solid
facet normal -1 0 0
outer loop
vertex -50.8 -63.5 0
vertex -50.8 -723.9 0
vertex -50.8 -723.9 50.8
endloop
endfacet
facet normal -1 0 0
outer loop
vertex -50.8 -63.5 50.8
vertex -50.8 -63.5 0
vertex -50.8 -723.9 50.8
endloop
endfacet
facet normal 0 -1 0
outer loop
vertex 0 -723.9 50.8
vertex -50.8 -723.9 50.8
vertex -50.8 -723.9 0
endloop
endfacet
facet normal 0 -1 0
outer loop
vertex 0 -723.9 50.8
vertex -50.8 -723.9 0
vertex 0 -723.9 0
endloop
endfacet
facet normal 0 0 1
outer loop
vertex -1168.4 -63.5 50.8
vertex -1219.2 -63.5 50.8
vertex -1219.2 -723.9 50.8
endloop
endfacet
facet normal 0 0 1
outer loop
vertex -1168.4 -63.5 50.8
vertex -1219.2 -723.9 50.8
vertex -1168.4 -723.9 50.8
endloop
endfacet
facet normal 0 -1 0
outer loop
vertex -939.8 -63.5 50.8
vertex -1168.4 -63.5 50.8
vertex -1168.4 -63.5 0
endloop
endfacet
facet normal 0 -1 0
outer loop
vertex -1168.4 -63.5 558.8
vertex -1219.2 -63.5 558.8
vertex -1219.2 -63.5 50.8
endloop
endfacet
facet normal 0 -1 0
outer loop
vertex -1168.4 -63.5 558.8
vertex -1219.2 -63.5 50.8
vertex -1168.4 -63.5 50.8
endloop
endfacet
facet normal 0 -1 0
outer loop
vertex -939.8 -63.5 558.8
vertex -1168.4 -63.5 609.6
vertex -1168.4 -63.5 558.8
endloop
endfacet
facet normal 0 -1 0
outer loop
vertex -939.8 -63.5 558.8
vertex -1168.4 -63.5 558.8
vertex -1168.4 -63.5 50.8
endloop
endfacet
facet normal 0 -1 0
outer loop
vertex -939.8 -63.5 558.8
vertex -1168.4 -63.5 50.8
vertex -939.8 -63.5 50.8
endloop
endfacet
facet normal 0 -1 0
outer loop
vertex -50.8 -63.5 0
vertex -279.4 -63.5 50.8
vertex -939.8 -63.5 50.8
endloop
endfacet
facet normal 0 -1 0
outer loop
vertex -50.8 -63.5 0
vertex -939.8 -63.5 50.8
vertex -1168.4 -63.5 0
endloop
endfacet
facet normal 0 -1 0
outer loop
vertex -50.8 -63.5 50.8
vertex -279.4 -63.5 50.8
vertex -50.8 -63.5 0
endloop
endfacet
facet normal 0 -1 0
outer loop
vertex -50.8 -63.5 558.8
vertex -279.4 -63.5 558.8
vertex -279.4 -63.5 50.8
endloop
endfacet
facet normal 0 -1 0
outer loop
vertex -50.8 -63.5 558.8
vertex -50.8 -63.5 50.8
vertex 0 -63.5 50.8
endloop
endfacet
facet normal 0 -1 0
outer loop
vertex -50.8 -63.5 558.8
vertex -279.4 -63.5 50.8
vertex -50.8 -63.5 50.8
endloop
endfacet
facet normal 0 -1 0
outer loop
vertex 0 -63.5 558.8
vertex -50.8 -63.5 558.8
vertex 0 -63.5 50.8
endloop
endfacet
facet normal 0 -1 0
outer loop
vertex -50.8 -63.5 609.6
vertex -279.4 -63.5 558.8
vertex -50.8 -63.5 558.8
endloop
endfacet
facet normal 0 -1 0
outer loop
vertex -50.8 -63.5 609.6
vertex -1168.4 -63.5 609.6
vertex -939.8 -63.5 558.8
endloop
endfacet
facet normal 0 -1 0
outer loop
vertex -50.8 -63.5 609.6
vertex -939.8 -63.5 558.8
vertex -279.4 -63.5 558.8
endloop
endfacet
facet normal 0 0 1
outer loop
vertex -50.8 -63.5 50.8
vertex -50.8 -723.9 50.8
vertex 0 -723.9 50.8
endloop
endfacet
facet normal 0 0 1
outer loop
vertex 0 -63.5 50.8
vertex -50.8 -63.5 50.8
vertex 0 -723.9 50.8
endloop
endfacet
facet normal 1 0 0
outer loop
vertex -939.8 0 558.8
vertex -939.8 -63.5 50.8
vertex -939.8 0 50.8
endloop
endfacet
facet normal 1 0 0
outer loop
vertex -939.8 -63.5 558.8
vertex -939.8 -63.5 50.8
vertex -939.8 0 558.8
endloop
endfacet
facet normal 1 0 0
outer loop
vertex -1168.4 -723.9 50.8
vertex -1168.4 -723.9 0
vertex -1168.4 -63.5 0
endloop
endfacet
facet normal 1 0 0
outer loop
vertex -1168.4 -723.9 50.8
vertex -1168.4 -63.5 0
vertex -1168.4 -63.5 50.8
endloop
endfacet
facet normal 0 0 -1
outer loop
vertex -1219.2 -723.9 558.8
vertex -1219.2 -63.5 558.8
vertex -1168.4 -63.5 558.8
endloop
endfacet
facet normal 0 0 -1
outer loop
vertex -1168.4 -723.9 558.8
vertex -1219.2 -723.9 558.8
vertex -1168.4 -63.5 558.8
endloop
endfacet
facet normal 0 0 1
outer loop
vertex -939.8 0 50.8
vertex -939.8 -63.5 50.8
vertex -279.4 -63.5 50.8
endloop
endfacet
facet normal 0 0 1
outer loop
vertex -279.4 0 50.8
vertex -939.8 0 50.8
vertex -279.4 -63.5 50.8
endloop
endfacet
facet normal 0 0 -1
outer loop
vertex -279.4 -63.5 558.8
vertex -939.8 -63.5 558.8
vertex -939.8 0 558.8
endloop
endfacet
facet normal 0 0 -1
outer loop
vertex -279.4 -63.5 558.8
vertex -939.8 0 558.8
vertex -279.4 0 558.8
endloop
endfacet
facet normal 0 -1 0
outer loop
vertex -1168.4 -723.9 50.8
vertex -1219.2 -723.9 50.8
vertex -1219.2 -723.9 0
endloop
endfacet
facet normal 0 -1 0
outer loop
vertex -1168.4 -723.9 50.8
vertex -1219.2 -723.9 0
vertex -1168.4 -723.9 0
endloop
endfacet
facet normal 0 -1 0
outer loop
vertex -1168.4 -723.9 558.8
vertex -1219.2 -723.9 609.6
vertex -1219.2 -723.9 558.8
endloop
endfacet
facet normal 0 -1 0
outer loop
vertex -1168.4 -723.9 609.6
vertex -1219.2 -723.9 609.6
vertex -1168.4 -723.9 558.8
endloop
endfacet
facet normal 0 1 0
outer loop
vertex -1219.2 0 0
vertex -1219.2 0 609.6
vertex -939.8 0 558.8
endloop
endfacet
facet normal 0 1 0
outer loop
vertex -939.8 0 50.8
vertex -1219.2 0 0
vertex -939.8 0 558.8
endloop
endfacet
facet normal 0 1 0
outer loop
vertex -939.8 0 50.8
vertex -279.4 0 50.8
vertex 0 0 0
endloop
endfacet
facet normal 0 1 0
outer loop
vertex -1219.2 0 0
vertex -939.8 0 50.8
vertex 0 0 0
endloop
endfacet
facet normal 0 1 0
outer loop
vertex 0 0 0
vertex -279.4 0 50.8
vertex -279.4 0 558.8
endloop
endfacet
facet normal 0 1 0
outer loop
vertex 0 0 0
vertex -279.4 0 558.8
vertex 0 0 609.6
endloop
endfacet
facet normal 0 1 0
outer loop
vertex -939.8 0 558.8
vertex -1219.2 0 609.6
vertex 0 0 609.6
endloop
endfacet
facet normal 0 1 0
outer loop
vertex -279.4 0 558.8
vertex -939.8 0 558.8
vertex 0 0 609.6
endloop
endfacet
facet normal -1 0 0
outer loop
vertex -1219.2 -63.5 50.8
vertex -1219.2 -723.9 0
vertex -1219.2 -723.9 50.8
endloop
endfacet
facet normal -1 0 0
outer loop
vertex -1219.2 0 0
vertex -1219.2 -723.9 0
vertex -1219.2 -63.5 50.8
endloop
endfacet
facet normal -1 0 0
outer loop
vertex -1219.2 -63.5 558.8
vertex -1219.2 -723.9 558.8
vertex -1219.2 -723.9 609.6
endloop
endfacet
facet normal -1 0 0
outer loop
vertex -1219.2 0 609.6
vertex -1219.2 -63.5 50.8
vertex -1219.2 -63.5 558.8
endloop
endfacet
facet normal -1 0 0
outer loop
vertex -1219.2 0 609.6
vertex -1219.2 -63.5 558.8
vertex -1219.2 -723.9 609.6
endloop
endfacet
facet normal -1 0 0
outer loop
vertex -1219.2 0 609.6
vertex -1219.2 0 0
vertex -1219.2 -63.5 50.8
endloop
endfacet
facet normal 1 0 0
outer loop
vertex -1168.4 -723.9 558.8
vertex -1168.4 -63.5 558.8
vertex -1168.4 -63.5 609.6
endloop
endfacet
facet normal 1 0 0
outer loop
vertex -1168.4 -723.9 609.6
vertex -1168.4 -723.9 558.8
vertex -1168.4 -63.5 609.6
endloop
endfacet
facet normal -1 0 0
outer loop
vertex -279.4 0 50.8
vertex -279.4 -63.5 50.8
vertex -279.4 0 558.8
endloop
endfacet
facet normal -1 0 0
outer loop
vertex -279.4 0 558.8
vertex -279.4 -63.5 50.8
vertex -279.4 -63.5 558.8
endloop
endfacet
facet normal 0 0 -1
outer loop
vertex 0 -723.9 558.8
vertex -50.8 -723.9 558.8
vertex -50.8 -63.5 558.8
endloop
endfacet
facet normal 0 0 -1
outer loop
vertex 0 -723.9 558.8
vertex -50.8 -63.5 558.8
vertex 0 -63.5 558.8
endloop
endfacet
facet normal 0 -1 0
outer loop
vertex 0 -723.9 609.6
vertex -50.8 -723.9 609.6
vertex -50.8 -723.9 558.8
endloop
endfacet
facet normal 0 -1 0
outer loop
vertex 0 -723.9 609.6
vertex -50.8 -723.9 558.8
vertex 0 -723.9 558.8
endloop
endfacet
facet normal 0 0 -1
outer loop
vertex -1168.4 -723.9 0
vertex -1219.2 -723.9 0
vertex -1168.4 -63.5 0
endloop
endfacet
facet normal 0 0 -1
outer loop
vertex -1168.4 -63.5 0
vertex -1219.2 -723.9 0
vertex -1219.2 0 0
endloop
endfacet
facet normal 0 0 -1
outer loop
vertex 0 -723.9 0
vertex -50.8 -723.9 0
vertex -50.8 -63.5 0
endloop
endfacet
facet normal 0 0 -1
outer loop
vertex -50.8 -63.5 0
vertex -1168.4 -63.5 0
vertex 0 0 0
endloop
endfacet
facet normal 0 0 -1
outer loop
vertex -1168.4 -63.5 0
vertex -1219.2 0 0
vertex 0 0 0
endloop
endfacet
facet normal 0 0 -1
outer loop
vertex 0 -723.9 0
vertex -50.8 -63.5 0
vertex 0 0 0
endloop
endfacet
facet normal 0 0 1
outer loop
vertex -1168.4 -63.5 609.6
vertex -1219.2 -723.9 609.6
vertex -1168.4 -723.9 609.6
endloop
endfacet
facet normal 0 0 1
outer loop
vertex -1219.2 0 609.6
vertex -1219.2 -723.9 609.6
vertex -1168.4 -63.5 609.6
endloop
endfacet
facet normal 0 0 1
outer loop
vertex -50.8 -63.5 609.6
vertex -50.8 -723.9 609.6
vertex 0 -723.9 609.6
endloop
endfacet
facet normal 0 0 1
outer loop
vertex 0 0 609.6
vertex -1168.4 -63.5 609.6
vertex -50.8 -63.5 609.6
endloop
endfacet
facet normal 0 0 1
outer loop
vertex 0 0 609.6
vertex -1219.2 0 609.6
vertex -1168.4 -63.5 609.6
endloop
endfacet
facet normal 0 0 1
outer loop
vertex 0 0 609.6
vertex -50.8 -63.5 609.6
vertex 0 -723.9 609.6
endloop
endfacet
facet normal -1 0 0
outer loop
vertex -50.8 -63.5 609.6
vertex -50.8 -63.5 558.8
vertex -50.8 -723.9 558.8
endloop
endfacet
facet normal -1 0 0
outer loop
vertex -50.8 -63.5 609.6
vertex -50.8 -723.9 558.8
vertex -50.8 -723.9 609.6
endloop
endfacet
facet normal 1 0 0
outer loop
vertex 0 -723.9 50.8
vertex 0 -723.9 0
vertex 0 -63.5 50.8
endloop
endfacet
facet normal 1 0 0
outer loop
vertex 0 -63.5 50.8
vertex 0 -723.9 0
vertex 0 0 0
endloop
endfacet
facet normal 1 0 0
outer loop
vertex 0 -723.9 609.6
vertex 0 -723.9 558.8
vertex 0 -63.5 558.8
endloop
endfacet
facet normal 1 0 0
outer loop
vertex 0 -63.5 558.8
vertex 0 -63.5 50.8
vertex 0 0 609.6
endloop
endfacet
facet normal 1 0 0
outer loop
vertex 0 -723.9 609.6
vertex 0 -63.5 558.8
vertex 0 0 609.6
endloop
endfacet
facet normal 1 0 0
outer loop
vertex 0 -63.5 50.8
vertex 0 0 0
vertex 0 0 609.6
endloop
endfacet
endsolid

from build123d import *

# Parameters (mm, degrees)
F0_W     = 1219.2
F0_H     = 609.6
F1_DEPTH = 63.5
F2_W     = 660.4
F2_H     = 508
F3_DEPTH = 114.3
F4_W     = 50.8
F4_H     = 50.8
F5_DEPTH = 660.4


with BuildPart() as f1:
    # F0 (on Front) → F1 (new body)
    with BuildSketch(Plane.XZ):
        with Locations((-609.6, 304.8)):
            Rectangle(F0_W, F0_H)
    extrude(amount=F1_DEPTH)

    # F2 (on face) → F3 (cut)
    with BuildSketch(Plane.XZ.offset(63.5)):
        with Locations((-609.6, 304.8)):
            Rectangle(F2_W, F2_H)
    extrude(amount=-F3_DEPTH, mode=Mode.SUBTRACT)

    # F4 (on face) → F5 (join)
    with BuildSketch(Plane.XZ.offset(63.5)):
        with Locations((-1193.8, 584.2)):
            Rectangle(F4_W, F4_H)
        with Locations((-1193.8, 25.4)):
            Rectangle(F4_W, F4_H)
        with Locations((-25.4, 25.4)):
            Rectangle(F4_W, F4_H)
        with Locations((-25.4, 584.2)):
            Rectangle(F4_W, F4_H)
    extrude(amount=F5_DEPTH)


solid = f1.part
